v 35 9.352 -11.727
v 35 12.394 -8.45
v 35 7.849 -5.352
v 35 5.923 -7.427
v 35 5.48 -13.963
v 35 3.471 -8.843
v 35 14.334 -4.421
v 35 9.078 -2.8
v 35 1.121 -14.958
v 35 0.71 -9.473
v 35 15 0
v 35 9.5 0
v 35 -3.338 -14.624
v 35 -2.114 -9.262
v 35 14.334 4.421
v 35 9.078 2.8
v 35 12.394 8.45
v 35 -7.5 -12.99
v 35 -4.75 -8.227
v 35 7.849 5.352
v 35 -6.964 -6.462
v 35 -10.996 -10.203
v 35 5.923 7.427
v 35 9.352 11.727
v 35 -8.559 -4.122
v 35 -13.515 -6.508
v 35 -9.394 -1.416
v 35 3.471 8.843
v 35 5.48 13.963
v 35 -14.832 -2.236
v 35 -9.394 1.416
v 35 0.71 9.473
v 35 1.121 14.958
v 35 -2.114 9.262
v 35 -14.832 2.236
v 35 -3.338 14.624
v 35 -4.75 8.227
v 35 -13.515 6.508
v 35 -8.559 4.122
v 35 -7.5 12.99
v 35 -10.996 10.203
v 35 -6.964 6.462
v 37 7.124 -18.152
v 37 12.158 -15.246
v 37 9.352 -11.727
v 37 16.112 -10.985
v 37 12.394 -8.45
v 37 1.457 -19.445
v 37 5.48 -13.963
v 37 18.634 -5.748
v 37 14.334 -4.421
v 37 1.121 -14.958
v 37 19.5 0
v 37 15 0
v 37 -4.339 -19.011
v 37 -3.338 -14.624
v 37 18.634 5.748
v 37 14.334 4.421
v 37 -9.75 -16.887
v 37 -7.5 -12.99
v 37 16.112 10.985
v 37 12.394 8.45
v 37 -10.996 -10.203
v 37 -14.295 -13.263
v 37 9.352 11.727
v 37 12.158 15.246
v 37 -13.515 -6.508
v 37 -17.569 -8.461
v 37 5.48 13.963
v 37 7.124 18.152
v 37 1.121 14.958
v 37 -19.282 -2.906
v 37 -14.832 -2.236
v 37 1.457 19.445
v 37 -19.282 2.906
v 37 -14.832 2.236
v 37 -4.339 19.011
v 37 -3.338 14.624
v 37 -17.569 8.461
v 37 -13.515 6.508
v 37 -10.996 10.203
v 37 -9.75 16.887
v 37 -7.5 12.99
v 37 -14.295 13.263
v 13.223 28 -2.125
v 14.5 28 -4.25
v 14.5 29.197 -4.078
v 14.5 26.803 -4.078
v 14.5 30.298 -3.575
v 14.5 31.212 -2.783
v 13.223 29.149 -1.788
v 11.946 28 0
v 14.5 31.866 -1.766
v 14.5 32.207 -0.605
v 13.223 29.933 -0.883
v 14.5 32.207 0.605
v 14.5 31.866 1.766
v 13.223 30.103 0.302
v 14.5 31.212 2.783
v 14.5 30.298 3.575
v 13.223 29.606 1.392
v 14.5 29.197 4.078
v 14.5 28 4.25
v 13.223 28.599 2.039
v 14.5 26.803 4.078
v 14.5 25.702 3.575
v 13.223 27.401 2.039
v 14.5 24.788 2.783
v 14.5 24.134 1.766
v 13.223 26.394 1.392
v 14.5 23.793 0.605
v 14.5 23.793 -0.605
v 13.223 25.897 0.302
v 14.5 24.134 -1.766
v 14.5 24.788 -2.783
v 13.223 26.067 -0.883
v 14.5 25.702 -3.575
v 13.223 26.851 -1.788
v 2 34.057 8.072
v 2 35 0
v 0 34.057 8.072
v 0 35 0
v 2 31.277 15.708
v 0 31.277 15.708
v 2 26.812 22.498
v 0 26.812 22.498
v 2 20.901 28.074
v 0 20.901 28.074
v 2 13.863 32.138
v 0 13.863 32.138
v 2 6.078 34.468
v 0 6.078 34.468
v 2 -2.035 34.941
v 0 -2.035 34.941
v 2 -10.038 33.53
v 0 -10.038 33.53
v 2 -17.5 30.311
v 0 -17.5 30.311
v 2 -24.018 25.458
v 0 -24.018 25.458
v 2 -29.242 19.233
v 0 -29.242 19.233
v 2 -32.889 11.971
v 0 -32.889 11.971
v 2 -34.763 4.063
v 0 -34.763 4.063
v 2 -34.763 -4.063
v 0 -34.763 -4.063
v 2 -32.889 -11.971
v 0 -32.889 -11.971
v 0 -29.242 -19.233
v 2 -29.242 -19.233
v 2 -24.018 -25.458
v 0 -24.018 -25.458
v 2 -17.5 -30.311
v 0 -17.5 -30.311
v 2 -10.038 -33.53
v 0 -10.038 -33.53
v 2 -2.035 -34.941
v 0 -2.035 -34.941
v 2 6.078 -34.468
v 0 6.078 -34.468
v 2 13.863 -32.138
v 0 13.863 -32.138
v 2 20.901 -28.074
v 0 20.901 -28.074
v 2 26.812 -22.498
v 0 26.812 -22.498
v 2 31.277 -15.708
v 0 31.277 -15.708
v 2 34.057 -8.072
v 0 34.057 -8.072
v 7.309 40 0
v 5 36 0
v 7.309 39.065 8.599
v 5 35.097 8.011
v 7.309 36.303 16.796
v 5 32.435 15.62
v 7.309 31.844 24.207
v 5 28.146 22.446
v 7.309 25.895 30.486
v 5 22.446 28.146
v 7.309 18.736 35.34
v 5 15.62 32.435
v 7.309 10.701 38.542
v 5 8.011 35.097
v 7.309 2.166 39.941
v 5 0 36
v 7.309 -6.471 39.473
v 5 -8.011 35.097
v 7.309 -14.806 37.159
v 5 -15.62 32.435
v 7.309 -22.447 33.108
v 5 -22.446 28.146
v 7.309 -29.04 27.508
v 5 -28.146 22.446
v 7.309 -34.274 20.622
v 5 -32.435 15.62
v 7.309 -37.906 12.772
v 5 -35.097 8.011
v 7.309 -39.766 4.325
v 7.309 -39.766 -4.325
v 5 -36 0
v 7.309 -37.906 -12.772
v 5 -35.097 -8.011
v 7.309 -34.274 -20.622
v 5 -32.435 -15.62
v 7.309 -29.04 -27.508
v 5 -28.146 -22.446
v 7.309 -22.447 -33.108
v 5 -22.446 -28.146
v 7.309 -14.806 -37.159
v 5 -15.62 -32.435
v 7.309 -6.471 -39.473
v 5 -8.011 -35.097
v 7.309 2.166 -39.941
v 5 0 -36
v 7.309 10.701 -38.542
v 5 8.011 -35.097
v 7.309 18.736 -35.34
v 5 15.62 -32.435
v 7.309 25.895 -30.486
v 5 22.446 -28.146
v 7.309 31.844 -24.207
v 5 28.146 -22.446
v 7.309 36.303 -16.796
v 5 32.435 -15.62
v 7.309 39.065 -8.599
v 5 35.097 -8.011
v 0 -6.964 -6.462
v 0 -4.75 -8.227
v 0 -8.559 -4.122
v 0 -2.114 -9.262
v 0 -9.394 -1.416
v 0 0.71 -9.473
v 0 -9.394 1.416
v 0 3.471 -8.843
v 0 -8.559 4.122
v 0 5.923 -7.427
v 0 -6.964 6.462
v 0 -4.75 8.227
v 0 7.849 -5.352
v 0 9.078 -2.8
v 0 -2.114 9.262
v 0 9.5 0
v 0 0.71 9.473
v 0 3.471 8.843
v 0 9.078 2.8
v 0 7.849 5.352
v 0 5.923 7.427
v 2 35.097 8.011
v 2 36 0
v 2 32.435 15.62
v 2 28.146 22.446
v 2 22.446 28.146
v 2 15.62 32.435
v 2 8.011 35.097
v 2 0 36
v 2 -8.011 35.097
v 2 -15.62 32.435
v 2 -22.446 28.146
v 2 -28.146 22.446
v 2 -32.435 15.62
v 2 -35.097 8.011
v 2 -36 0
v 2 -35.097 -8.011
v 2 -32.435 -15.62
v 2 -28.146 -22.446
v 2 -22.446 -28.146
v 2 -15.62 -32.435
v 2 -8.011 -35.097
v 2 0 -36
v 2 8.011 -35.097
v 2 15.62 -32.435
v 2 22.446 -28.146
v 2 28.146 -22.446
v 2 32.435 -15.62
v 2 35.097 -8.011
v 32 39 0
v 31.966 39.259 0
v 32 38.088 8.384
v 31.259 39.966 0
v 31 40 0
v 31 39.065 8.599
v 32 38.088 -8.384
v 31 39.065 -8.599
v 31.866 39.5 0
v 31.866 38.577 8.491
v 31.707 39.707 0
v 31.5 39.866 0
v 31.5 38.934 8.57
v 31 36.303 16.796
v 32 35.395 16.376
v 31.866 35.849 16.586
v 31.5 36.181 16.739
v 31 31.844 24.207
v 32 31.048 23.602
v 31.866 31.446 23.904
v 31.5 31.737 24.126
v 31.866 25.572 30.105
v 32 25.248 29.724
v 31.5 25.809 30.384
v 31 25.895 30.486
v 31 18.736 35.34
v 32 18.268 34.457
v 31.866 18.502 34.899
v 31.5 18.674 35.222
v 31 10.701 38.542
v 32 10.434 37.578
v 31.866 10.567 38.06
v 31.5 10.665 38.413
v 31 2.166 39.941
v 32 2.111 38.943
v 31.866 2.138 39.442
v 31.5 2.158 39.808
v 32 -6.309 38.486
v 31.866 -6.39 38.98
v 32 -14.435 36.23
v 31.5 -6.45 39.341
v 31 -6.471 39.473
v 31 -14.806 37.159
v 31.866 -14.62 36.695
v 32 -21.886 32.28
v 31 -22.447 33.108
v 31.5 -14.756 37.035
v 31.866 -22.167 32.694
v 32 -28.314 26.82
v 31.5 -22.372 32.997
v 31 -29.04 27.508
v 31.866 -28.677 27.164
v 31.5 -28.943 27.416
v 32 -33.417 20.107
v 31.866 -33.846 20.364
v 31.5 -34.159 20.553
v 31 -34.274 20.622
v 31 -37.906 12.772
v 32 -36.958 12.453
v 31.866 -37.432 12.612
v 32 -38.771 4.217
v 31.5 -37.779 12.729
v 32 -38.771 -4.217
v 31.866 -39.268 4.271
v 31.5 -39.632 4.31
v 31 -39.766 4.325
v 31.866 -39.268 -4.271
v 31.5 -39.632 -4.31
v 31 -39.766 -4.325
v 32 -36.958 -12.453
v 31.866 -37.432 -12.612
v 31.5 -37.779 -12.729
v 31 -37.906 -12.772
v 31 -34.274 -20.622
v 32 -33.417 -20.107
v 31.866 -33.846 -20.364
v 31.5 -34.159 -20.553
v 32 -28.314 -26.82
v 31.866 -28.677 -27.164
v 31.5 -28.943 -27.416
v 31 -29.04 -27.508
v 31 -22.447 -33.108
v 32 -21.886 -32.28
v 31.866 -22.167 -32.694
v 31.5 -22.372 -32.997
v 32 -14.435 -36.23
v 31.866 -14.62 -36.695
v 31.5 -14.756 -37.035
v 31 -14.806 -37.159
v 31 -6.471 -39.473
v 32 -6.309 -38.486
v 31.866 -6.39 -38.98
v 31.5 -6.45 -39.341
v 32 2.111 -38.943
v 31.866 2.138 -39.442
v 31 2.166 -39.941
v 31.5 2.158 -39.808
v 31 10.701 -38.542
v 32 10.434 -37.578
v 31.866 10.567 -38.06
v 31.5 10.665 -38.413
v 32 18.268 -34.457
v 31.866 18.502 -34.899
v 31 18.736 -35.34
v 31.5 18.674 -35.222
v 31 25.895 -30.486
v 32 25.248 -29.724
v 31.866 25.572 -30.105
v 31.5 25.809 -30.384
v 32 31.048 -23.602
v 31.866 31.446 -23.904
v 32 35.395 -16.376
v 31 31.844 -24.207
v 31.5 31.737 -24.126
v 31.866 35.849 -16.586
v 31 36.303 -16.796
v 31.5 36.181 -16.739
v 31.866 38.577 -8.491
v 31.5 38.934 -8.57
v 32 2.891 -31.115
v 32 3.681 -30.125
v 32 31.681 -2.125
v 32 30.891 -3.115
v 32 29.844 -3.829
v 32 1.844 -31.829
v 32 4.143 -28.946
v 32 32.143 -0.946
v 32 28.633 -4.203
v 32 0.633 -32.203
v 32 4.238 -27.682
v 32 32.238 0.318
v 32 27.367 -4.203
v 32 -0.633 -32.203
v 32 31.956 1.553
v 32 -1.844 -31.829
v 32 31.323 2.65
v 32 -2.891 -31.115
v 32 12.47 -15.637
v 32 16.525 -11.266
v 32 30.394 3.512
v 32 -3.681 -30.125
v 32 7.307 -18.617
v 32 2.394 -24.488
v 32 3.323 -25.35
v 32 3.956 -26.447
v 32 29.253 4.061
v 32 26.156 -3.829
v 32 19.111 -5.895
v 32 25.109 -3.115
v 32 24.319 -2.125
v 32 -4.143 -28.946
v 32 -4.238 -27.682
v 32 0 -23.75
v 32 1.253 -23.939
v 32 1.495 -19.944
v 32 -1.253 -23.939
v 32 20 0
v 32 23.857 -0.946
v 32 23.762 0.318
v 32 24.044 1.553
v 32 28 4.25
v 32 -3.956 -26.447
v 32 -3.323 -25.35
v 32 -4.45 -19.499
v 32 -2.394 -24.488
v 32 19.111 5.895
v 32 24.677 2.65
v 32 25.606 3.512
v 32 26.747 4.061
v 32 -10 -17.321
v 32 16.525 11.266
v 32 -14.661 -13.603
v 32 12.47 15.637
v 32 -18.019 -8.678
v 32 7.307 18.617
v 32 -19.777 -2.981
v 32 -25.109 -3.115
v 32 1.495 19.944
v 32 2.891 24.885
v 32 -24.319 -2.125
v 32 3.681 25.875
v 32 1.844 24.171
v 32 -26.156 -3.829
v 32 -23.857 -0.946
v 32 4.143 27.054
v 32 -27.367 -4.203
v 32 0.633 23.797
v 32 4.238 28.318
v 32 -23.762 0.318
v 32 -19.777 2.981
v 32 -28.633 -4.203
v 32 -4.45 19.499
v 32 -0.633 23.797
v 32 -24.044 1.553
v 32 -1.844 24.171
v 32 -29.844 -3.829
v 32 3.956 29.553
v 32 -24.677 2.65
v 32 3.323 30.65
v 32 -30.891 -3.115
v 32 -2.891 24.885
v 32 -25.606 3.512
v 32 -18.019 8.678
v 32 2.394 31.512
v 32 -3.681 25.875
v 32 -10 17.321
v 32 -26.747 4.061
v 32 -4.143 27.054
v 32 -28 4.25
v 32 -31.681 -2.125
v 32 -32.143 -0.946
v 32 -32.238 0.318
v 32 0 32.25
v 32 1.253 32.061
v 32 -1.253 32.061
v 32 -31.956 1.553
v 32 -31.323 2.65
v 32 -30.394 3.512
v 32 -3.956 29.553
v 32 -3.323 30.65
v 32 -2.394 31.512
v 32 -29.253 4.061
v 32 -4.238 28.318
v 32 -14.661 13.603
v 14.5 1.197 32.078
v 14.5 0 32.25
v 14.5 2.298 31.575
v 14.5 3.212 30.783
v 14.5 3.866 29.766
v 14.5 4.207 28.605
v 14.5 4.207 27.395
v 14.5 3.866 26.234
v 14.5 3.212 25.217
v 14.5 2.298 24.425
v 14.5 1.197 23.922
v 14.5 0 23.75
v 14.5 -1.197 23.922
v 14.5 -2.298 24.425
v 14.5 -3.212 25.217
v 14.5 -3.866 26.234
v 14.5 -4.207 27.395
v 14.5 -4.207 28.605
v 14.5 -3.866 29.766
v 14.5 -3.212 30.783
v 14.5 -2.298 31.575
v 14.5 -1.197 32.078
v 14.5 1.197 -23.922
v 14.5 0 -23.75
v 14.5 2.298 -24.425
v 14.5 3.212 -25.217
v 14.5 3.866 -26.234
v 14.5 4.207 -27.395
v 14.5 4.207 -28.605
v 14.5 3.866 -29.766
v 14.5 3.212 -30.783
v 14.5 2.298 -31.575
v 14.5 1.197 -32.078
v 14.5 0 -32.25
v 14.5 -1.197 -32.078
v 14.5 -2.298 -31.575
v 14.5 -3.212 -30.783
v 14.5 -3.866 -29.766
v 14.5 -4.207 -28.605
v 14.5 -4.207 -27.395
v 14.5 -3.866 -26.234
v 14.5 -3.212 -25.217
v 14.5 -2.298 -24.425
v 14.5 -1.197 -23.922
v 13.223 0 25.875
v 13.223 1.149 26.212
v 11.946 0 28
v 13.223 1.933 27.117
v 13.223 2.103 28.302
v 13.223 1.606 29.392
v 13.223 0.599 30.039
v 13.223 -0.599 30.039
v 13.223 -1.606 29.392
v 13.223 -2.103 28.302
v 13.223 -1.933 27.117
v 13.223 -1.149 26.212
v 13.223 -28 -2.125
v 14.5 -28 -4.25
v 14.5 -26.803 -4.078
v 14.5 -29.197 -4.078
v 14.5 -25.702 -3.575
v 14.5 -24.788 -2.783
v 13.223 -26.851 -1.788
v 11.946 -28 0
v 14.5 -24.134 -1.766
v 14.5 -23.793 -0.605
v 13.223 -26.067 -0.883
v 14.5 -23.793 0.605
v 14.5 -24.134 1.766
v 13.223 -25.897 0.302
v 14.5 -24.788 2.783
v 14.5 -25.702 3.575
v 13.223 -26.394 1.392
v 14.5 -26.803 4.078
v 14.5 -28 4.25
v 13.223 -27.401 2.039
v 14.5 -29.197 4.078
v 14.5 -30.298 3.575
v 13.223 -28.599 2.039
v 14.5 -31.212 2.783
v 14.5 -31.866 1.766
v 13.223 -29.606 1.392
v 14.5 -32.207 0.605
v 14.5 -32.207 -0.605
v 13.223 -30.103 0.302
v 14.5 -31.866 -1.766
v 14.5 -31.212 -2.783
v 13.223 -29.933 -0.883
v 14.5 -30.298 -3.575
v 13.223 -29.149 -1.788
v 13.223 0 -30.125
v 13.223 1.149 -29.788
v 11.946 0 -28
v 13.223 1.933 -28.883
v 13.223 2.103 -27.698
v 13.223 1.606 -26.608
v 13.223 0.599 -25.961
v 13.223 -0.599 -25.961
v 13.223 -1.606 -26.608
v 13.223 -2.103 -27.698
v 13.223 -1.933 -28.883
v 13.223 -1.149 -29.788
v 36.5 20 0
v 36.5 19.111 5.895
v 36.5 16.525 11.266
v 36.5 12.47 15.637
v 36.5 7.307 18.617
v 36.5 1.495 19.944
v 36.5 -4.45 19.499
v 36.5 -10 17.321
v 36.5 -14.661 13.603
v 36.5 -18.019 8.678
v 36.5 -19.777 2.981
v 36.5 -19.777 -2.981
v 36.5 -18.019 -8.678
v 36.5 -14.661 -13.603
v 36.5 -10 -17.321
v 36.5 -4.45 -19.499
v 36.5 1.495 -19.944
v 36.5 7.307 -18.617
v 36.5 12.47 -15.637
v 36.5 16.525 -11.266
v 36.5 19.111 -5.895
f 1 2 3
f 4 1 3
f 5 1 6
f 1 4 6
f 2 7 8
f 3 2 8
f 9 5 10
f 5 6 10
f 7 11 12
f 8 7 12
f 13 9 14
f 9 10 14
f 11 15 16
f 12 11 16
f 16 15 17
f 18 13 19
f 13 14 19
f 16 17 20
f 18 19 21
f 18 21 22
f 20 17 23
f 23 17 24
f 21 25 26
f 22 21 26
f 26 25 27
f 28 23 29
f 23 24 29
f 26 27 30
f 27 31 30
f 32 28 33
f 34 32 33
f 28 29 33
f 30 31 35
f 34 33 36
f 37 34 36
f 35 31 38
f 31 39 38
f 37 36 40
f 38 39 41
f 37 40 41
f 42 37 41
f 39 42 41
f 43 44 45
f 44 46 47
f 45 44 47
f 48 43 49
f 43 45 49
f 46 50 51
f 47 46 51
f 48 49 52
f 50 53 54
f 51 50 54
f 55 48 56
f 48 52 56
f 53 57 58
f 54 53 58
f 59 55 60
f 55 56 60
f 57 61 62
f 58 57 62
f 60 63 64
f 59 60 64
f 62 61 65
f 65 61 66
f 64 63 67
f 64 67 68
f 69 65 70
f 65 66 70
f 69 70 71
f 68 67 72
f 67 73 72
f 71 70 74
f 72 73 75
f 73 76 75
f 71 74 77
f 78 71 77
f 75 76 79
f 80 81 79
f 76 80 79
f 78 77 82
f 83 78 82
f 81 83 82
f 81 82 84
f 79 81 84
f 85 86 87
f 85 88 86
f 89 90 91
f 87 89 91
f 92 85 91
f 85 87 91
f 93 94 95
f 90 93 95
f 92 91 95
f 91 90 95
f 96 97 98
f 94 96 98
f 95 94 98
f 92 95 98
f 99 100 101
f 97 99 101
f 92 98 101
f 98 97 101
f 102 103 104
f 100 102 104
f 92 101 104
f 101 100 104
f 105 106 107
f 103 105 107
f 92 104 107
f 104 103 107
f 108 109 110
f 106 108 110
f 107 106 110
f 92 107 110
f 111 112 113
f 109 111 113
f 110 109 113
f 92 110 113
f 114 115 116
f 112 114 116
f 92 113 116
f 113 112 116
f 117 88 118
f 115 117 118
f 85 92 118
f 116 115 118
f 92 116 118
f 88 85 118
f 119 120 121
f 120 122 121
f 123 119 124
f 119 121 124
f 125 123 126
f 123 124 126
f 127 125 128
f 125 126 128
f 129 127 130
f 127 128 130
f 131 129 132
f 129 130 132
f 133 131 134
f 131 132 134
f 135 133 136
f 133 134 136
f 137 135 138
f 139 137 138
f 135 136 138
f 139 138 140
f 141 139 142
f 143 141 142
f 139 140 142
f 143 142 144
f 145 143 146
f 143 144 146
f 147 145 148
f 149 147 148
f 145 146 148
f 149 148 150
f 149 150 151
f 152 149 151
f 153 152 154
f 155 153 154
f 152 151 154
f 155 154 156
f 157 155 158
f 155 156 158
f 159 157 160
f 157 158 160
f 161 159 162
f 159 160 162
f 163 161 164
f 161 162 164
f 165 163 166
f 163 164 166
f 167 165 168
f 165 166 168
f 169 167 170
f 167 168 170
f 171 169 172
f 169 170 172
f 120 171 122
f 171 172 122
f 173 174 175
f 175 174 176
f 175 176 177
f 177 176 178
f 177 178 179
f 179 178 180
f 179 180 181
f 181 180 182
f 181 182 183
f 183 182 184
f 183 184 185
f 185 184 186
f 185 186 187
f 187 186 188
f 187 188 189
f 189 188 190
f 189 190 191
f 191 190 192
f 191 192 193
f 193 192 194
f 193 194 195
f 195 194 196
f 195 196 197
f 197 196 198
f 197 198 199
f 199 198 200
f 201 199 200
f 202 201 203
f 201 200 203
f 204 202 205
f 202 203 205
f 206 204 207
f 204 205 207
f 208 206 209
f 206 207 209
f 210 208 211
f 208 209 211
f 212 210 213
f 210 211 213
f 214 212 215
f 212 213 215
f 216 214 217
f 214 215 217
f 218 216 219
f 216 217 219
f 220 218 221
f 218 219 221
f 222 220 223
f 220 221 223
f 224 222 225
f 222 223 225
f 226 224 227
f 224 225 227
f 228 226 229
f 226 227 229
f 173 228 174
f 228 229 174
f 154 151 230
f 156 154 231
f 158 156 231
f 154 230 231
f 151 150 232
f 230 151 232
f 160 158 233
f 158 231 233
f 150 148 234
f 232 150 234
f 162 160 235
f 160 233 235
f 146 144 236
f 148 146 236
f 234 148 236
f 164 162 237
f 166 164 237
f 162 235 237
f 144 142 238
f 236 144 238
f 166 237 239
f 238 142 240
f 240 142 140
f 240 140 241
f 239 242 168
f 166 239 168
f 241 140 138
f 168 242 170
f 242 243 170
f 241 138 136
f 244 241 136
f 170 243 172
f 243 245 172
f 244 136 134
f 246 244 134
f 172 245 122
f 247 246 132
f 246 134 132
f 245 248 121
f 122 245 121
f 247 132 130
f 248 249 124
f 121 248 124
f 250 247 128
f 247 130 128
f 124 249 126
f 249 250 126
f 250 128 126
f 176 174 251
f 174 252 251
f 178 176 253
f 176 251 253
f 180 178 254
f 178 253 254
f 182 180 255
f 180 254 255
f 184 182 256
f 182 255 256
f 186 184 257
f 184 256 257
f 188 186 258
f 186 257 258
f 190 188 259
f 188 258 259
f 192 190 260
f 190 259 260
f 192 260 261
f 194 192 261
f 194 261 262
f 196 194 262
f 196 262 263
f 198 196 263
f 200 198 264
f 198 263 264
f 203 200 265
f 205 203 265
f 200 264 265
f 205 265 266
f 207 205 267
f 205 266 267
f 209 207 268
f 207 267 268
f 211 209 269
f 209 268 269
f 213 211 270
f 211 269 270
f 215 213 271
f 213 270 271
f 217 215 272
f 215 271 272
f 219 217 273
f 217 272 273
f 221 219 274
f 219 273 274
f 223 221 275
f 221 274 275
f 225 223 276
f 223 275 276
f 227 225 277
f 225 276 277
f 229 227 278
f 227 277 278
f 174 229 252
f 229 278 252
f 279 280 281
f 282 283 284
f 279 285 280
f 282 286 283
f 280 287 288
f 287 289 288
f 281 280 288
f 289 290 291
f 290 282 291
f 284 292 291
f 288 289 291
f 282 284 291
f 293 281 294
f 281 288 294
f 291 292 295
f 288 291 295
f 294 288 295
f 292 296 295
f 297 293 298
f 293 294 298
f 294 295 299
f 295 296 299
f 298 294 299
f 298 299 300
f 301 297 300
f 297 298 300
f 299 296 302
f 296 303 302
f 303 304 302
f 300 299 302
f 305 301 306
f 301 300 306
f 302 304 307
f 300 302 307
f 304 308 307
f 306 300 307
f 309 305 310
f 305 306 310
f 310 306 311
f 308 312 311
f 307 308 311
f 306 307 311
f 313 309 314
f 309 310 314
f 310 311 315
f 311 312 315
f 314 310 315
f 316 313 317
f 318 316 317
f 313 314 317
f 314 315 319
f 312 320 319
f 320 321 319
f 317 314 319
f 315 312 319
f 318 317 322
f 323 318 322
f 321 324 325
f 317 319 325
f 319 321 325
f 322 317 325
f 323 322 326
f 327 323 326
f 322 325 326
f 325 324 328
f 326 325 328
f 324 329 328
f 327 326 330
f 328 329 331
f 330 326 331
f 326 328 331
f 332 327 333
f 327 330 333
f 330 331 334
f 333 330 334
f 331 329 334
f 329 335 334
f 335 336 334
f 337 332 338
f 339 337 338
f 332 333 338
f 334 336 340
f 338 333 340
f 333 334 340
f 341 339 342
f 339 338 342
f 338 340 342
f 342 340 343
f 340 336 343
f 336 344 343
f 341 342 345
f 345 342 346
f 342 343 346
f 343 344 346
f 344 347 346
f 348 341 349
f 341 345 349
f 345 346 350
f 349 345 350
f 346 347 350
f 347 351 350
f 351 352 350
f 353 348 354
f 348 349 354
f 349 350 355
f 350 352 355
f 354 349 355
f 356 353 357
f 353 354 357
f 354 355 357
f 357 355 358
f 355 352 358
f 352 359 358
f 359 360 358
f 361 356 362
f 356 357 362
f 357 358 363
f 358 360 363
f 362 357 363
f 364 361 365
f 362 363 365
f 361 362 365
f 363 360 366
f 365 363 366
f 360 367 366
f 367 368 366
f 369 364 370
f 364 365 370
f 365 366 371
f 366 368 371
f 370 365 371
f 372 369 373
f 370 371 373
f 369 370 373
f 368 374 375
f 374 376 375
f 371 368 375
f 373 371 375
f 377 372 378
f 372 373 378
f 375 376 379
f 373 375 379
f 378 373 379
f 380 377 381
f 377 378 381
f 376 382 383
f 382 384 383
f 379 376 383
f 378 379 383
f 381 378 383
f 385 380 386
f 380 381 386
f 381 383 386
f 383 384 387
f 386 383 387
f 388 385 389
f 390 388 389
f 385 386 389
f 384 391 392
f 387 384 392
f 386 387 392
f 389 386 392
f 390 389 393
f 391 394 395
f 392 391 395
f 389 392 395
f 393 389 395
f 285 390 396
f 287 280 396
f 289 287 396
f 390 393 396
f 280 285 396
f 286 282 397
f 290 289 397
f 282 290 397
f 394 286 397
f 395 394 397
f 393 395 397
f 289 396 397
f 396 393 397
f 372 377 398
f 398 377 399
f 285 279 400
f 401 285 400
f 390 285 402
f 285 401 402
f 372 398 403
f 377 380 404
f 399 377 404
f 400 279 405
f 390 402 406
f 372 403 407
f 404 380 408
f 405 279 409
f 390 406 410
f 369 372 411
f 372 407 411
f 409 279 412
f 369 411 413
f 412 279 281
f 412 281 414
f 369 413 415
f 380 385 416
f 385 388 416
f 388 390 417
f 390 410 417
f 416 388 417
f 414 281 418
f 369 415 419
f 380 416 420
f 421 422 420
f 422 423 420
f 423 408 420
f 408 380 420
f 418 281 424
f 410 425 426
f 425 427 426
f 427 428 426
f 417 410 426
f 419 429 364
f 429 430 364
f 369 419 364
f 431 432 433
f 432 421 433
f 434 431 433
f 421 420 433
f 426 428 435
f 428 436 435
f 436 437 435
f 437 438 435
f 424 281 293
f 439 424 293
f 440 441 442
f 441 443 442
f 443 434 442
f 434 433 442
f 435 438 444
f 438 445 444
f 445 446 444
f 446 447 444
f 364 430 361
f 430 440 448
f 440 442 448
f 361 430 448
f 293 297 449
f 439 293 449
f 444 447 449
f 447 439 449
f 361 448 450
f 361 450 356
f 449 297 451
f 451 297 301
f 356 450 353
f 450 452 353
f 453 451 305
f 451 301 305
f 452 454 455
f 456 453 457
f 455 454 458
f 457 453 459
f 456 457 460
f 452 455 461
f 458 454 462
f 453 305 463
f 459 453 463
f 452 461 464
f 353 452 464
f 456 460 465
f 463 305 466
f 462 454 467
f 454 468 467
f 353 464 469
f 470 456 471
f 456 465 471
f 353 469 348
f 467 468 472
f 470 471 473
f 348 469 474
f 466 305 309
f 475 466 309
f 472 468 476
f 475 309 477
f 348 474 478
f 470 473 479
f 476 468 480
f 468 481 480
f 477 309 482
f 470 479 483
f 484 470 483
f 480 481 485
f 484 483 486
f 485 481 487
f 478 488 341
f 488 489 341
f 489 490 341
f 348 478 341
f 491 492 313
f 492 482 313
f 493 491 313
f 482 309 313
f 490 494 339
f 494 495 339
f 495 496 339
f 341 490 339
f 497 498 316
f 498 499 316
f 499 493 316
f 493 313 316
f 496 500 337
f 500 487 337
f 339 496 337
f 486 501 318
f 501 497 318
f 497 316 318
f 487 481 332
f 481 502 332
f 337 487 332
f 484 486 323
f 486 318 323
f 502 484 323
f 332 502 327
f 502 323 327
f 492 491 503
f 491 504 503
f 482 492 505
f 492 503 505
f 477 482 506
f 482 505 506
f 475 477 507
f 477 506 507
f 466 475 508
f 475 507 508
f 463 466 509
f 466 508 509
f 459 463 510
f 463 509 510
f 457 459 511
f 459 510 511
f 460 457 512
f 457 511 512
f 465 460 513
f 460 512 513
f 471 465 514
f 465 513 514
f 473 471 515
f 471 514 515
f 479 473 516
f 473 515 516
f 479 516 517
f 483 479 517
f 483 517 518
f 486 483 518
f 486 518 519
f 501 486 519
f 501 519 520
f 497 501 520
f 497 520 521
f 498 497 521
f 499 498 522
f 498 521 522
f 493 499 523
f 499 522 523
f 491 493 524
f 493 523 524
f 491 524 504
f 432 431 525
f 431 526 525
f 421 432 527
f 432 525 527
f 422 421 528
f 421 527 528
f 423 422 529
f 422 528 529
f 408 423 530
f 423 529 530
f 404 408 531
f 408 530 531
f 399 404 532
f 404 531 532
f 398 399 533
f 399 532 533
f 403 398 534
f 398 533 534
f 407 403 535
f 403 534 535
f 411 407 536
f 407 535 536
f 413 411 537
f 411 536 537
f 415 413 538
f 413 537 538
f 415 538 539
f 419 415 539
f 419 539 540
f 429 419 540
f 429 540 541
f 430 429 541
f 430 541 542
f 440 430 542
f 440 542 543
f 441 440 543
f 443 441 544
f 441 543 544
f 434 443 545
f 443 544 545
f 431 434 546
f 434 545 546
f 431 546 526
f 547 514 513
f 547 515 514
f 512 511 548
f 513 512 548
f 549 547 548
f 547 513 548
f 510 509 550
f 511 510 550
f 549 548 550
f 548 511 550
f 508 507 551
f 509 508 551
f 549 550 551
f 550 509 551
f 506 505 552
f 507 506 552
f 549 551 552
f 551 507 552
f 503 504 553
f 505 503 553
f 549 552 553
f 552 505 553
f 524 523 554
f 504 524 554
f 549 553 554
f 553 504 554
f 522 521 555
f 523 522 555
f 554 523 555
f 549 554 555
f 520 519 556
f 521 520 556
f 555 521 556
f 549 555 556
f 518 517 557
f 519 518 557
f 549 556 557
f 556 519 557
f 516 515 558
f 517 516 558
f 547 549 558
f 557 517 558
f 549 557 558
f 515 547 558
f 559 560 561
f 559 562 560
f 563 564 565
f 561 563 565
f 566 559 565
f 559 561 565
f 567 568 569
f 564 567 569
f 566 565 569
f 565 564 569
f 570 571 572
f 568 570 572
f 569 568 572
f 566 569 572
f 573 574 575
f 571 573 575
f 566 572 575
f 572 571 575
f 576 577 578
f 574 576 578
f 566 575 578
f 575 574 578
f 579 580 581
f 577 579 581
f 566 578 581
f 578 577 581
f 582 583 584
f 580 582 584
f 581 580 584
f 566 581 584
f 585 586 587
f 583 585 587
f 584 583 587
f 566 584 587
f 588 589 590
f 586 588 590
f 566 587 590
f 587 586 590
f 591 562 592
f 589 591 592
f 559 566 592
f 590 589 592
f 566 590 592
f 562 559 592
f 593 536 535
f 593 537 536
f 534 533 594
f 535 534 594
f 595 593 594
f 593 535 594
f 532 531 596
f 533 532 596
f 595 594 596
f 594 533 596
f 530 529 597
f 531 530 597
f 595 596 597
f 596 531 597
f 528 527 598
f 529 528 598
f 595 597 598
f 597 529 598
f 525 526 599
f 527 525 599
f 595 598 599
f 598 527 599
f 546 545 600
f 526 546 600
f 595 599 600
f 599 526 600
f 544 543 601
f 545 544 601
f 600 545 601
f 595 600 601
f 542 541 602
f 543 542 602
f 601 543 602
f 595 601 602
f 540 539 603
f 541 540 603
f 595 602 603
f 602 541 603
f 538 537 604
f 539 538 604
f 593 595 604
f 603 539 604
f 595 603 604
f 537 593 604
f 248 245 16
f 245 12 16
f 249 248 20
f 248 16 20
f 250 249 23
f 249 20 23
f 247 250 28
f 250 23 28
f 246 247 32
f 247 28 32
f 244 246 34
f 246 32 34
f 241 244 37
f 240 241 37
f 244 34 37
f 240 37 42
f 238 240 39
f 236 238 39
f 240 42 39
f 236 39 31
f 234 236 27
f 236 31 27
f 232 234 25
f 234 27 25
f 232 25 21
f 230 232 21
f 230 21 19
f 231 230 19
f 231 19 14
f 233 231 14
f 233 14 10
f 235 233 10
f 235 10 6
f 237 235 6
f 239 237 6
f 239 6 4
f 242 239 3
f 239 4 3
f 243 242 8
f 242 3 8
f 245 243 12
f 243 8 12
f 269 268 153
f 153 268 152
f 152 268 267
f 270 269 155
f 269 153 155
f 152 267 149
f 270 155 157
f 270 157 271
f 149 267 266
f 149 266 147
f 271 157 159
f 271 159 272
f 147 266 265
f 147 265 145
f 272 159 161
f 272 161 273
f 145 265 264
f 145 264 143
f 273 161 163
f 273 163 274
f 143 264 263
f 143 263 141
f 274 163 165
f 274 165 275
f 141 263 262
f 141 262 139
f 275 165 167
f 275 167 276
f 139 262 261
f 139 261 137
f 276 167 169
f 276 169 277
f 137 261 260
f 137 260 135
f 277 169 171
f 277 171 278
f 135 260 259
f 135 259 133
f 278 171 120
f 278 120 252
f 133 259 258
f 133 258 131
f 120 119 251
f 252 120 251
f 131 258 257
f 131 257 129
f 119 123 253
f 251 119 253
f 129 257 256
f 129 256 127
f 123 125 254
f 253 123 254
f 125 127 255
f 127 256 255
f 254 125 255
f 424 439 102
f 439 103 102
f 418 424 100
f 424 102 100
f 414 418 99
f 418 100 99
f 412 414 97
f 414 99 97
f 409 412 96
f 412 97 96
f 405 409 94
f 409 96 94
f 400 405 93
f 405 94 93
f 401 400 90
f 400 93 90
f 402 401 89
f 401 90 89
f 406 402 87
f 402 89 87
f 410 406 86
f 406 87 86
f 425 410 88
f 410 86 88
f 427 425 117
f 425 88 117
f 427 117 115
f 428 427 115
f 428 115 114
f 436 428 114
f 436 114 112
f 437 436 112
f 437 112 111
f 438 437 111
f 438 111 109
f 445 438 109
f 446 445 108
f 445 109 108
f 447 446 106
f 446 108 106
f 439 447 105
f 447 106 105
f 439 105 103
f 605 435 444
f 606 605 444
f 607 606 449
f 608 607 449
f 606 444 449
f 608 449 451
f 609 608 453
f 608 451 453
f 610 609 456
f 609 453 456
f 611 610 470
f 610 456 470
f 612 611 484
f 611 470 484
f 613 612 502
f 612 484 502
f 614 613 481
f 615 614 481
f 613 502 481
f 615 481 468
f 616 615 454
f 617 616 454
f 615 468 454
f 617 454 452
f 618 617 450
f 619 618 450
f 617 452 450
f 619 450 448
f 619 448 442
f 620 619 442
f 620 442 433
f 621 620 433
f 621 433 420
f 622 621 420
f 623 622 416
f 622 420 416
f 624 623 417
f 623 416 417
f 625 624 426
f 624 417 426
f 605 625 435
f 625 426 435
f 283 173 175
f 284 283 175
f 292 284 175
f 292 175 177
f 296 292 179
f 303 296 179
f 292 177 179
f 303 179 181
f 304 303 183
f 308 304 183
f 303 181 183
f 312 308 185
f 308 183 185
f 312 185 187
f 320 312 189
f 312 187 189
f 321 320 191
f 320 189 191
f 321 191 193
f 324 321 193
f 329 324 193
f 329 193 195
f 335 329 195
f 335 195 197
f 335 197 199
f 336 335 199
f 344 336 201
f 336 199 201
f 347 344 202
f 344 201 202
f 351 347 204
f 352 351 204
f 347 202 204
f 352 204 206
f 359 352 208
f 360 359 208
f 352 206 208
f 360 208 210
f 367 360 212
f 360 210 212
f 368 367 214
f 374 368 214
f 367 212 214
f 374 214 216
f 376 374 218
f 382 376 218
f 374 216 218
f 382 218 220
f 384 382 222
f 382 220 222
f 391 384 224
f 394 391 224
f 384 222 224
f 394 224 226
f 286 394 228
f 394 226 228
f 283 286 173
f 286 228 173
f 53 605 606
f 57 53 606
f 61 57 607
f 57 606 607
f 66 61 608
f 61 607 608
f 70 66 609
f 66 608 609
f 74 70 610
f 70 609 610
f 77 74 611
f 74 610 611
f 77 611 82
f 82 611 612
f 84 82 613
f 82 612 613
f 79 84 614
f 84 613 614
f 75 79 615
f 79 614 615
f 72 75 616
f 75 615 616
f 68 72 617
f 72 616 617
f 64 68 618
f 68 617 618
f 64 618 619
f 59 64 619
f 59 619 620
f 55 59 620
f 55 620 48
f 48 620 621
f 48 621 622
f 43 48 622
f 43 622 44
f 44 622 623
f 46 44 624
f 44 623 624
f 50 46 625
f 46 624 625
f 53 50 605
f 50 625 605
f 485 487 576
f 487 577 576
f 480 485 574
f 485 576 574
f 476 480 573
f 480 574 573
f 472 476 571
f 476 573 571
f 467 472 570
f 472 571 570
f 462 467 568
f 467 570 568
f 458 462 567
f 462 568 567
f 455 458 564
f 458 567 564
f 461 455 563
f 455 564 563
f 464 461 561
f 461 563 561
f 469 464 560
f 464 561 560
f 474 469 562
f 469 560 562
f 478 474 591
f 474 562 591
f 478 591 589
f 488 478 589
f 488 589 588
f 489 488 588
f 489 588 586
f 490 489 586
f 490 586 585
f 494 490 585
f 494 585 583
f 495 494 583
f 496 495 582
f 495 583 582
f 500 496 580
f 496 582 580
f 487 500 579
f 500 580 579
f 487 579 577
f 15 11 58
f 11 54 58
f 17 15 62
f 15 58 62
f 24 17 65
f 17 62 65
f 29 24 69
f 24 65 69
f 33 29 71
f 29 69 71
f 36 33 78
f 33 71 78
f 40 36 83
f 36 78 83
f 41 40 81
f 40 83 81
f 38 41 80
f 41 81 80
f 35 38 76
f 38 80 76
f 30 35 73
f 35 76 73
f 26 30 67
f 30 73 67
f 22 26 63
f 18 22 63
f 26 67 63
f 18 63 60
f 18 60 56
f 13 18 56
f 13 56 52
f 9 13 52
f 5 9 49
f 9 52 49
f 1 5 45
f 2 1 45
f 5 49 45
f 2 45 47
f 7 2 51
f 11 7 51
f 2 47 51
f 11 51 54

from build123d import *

# Parameters (mm, degrees)
REJFNING_0_5_X_45_GR_SIZE = 0.5
RUNDING_R1_R              = 1
HOLE1_D                   = 8.5
HOLE1_DEPTH               = 17.5
HOLE1_TIP                 = 2.553657631


with BuildPart() as part:
    # Sketch1 → Base-Revolve (revolve)
    with BuildSketch(Plane.XY):
        Polygon((0, 9.5), (35, 9.5), (35, 15), (37, 15), (37, 20), (32, 20), (32, 40), (7.309401077, 40), (5, 36), (2, 36), (2, 35), (0, 35), align=None)
    revolve(axis=Axis((-31.276903974, 0, 0), (1, 0, 0)))

    # Rejfning 0,5 x 45 gr.
    rejfning_0_5_x_45_gr_edges = [part.edges().sort_by_distance(p)[0] for p in [
        (37, -20, 0),
    ]]
    chamfer(rejfning_0_5_x_45_gr_edges, length=REJFNING_0_5_X_45_GR_SIZE)

    # Runding R1
    runding_r1_edges = [part.edges().sort_by_distance(p)[0] for p in [
        (32, -40, 0),
    ]]
    fillet(runding_r1_edges, radius=RUNDING_R1_R)

    # Hole1
    with Locations(Plane(origin=(32, 0, 0), x_dir=(0, 0, -1), z_dir=(1, 0, 0))):
        with Locations((0, 28), (-28, 0), (0, -28), (28, 0)):
            Hole(HOLE1_D / 2, depth=HOLE1_DEPTH)
            with Locations((0, 0, -(HOLE1_DEPTH + HOLE1_TIP / 2))):  # 118° drill point
                Cone(0, HOLE1_D / 2, HOLE1_TIP, mode=Mode.SUBTRACT)


solid = part.part
